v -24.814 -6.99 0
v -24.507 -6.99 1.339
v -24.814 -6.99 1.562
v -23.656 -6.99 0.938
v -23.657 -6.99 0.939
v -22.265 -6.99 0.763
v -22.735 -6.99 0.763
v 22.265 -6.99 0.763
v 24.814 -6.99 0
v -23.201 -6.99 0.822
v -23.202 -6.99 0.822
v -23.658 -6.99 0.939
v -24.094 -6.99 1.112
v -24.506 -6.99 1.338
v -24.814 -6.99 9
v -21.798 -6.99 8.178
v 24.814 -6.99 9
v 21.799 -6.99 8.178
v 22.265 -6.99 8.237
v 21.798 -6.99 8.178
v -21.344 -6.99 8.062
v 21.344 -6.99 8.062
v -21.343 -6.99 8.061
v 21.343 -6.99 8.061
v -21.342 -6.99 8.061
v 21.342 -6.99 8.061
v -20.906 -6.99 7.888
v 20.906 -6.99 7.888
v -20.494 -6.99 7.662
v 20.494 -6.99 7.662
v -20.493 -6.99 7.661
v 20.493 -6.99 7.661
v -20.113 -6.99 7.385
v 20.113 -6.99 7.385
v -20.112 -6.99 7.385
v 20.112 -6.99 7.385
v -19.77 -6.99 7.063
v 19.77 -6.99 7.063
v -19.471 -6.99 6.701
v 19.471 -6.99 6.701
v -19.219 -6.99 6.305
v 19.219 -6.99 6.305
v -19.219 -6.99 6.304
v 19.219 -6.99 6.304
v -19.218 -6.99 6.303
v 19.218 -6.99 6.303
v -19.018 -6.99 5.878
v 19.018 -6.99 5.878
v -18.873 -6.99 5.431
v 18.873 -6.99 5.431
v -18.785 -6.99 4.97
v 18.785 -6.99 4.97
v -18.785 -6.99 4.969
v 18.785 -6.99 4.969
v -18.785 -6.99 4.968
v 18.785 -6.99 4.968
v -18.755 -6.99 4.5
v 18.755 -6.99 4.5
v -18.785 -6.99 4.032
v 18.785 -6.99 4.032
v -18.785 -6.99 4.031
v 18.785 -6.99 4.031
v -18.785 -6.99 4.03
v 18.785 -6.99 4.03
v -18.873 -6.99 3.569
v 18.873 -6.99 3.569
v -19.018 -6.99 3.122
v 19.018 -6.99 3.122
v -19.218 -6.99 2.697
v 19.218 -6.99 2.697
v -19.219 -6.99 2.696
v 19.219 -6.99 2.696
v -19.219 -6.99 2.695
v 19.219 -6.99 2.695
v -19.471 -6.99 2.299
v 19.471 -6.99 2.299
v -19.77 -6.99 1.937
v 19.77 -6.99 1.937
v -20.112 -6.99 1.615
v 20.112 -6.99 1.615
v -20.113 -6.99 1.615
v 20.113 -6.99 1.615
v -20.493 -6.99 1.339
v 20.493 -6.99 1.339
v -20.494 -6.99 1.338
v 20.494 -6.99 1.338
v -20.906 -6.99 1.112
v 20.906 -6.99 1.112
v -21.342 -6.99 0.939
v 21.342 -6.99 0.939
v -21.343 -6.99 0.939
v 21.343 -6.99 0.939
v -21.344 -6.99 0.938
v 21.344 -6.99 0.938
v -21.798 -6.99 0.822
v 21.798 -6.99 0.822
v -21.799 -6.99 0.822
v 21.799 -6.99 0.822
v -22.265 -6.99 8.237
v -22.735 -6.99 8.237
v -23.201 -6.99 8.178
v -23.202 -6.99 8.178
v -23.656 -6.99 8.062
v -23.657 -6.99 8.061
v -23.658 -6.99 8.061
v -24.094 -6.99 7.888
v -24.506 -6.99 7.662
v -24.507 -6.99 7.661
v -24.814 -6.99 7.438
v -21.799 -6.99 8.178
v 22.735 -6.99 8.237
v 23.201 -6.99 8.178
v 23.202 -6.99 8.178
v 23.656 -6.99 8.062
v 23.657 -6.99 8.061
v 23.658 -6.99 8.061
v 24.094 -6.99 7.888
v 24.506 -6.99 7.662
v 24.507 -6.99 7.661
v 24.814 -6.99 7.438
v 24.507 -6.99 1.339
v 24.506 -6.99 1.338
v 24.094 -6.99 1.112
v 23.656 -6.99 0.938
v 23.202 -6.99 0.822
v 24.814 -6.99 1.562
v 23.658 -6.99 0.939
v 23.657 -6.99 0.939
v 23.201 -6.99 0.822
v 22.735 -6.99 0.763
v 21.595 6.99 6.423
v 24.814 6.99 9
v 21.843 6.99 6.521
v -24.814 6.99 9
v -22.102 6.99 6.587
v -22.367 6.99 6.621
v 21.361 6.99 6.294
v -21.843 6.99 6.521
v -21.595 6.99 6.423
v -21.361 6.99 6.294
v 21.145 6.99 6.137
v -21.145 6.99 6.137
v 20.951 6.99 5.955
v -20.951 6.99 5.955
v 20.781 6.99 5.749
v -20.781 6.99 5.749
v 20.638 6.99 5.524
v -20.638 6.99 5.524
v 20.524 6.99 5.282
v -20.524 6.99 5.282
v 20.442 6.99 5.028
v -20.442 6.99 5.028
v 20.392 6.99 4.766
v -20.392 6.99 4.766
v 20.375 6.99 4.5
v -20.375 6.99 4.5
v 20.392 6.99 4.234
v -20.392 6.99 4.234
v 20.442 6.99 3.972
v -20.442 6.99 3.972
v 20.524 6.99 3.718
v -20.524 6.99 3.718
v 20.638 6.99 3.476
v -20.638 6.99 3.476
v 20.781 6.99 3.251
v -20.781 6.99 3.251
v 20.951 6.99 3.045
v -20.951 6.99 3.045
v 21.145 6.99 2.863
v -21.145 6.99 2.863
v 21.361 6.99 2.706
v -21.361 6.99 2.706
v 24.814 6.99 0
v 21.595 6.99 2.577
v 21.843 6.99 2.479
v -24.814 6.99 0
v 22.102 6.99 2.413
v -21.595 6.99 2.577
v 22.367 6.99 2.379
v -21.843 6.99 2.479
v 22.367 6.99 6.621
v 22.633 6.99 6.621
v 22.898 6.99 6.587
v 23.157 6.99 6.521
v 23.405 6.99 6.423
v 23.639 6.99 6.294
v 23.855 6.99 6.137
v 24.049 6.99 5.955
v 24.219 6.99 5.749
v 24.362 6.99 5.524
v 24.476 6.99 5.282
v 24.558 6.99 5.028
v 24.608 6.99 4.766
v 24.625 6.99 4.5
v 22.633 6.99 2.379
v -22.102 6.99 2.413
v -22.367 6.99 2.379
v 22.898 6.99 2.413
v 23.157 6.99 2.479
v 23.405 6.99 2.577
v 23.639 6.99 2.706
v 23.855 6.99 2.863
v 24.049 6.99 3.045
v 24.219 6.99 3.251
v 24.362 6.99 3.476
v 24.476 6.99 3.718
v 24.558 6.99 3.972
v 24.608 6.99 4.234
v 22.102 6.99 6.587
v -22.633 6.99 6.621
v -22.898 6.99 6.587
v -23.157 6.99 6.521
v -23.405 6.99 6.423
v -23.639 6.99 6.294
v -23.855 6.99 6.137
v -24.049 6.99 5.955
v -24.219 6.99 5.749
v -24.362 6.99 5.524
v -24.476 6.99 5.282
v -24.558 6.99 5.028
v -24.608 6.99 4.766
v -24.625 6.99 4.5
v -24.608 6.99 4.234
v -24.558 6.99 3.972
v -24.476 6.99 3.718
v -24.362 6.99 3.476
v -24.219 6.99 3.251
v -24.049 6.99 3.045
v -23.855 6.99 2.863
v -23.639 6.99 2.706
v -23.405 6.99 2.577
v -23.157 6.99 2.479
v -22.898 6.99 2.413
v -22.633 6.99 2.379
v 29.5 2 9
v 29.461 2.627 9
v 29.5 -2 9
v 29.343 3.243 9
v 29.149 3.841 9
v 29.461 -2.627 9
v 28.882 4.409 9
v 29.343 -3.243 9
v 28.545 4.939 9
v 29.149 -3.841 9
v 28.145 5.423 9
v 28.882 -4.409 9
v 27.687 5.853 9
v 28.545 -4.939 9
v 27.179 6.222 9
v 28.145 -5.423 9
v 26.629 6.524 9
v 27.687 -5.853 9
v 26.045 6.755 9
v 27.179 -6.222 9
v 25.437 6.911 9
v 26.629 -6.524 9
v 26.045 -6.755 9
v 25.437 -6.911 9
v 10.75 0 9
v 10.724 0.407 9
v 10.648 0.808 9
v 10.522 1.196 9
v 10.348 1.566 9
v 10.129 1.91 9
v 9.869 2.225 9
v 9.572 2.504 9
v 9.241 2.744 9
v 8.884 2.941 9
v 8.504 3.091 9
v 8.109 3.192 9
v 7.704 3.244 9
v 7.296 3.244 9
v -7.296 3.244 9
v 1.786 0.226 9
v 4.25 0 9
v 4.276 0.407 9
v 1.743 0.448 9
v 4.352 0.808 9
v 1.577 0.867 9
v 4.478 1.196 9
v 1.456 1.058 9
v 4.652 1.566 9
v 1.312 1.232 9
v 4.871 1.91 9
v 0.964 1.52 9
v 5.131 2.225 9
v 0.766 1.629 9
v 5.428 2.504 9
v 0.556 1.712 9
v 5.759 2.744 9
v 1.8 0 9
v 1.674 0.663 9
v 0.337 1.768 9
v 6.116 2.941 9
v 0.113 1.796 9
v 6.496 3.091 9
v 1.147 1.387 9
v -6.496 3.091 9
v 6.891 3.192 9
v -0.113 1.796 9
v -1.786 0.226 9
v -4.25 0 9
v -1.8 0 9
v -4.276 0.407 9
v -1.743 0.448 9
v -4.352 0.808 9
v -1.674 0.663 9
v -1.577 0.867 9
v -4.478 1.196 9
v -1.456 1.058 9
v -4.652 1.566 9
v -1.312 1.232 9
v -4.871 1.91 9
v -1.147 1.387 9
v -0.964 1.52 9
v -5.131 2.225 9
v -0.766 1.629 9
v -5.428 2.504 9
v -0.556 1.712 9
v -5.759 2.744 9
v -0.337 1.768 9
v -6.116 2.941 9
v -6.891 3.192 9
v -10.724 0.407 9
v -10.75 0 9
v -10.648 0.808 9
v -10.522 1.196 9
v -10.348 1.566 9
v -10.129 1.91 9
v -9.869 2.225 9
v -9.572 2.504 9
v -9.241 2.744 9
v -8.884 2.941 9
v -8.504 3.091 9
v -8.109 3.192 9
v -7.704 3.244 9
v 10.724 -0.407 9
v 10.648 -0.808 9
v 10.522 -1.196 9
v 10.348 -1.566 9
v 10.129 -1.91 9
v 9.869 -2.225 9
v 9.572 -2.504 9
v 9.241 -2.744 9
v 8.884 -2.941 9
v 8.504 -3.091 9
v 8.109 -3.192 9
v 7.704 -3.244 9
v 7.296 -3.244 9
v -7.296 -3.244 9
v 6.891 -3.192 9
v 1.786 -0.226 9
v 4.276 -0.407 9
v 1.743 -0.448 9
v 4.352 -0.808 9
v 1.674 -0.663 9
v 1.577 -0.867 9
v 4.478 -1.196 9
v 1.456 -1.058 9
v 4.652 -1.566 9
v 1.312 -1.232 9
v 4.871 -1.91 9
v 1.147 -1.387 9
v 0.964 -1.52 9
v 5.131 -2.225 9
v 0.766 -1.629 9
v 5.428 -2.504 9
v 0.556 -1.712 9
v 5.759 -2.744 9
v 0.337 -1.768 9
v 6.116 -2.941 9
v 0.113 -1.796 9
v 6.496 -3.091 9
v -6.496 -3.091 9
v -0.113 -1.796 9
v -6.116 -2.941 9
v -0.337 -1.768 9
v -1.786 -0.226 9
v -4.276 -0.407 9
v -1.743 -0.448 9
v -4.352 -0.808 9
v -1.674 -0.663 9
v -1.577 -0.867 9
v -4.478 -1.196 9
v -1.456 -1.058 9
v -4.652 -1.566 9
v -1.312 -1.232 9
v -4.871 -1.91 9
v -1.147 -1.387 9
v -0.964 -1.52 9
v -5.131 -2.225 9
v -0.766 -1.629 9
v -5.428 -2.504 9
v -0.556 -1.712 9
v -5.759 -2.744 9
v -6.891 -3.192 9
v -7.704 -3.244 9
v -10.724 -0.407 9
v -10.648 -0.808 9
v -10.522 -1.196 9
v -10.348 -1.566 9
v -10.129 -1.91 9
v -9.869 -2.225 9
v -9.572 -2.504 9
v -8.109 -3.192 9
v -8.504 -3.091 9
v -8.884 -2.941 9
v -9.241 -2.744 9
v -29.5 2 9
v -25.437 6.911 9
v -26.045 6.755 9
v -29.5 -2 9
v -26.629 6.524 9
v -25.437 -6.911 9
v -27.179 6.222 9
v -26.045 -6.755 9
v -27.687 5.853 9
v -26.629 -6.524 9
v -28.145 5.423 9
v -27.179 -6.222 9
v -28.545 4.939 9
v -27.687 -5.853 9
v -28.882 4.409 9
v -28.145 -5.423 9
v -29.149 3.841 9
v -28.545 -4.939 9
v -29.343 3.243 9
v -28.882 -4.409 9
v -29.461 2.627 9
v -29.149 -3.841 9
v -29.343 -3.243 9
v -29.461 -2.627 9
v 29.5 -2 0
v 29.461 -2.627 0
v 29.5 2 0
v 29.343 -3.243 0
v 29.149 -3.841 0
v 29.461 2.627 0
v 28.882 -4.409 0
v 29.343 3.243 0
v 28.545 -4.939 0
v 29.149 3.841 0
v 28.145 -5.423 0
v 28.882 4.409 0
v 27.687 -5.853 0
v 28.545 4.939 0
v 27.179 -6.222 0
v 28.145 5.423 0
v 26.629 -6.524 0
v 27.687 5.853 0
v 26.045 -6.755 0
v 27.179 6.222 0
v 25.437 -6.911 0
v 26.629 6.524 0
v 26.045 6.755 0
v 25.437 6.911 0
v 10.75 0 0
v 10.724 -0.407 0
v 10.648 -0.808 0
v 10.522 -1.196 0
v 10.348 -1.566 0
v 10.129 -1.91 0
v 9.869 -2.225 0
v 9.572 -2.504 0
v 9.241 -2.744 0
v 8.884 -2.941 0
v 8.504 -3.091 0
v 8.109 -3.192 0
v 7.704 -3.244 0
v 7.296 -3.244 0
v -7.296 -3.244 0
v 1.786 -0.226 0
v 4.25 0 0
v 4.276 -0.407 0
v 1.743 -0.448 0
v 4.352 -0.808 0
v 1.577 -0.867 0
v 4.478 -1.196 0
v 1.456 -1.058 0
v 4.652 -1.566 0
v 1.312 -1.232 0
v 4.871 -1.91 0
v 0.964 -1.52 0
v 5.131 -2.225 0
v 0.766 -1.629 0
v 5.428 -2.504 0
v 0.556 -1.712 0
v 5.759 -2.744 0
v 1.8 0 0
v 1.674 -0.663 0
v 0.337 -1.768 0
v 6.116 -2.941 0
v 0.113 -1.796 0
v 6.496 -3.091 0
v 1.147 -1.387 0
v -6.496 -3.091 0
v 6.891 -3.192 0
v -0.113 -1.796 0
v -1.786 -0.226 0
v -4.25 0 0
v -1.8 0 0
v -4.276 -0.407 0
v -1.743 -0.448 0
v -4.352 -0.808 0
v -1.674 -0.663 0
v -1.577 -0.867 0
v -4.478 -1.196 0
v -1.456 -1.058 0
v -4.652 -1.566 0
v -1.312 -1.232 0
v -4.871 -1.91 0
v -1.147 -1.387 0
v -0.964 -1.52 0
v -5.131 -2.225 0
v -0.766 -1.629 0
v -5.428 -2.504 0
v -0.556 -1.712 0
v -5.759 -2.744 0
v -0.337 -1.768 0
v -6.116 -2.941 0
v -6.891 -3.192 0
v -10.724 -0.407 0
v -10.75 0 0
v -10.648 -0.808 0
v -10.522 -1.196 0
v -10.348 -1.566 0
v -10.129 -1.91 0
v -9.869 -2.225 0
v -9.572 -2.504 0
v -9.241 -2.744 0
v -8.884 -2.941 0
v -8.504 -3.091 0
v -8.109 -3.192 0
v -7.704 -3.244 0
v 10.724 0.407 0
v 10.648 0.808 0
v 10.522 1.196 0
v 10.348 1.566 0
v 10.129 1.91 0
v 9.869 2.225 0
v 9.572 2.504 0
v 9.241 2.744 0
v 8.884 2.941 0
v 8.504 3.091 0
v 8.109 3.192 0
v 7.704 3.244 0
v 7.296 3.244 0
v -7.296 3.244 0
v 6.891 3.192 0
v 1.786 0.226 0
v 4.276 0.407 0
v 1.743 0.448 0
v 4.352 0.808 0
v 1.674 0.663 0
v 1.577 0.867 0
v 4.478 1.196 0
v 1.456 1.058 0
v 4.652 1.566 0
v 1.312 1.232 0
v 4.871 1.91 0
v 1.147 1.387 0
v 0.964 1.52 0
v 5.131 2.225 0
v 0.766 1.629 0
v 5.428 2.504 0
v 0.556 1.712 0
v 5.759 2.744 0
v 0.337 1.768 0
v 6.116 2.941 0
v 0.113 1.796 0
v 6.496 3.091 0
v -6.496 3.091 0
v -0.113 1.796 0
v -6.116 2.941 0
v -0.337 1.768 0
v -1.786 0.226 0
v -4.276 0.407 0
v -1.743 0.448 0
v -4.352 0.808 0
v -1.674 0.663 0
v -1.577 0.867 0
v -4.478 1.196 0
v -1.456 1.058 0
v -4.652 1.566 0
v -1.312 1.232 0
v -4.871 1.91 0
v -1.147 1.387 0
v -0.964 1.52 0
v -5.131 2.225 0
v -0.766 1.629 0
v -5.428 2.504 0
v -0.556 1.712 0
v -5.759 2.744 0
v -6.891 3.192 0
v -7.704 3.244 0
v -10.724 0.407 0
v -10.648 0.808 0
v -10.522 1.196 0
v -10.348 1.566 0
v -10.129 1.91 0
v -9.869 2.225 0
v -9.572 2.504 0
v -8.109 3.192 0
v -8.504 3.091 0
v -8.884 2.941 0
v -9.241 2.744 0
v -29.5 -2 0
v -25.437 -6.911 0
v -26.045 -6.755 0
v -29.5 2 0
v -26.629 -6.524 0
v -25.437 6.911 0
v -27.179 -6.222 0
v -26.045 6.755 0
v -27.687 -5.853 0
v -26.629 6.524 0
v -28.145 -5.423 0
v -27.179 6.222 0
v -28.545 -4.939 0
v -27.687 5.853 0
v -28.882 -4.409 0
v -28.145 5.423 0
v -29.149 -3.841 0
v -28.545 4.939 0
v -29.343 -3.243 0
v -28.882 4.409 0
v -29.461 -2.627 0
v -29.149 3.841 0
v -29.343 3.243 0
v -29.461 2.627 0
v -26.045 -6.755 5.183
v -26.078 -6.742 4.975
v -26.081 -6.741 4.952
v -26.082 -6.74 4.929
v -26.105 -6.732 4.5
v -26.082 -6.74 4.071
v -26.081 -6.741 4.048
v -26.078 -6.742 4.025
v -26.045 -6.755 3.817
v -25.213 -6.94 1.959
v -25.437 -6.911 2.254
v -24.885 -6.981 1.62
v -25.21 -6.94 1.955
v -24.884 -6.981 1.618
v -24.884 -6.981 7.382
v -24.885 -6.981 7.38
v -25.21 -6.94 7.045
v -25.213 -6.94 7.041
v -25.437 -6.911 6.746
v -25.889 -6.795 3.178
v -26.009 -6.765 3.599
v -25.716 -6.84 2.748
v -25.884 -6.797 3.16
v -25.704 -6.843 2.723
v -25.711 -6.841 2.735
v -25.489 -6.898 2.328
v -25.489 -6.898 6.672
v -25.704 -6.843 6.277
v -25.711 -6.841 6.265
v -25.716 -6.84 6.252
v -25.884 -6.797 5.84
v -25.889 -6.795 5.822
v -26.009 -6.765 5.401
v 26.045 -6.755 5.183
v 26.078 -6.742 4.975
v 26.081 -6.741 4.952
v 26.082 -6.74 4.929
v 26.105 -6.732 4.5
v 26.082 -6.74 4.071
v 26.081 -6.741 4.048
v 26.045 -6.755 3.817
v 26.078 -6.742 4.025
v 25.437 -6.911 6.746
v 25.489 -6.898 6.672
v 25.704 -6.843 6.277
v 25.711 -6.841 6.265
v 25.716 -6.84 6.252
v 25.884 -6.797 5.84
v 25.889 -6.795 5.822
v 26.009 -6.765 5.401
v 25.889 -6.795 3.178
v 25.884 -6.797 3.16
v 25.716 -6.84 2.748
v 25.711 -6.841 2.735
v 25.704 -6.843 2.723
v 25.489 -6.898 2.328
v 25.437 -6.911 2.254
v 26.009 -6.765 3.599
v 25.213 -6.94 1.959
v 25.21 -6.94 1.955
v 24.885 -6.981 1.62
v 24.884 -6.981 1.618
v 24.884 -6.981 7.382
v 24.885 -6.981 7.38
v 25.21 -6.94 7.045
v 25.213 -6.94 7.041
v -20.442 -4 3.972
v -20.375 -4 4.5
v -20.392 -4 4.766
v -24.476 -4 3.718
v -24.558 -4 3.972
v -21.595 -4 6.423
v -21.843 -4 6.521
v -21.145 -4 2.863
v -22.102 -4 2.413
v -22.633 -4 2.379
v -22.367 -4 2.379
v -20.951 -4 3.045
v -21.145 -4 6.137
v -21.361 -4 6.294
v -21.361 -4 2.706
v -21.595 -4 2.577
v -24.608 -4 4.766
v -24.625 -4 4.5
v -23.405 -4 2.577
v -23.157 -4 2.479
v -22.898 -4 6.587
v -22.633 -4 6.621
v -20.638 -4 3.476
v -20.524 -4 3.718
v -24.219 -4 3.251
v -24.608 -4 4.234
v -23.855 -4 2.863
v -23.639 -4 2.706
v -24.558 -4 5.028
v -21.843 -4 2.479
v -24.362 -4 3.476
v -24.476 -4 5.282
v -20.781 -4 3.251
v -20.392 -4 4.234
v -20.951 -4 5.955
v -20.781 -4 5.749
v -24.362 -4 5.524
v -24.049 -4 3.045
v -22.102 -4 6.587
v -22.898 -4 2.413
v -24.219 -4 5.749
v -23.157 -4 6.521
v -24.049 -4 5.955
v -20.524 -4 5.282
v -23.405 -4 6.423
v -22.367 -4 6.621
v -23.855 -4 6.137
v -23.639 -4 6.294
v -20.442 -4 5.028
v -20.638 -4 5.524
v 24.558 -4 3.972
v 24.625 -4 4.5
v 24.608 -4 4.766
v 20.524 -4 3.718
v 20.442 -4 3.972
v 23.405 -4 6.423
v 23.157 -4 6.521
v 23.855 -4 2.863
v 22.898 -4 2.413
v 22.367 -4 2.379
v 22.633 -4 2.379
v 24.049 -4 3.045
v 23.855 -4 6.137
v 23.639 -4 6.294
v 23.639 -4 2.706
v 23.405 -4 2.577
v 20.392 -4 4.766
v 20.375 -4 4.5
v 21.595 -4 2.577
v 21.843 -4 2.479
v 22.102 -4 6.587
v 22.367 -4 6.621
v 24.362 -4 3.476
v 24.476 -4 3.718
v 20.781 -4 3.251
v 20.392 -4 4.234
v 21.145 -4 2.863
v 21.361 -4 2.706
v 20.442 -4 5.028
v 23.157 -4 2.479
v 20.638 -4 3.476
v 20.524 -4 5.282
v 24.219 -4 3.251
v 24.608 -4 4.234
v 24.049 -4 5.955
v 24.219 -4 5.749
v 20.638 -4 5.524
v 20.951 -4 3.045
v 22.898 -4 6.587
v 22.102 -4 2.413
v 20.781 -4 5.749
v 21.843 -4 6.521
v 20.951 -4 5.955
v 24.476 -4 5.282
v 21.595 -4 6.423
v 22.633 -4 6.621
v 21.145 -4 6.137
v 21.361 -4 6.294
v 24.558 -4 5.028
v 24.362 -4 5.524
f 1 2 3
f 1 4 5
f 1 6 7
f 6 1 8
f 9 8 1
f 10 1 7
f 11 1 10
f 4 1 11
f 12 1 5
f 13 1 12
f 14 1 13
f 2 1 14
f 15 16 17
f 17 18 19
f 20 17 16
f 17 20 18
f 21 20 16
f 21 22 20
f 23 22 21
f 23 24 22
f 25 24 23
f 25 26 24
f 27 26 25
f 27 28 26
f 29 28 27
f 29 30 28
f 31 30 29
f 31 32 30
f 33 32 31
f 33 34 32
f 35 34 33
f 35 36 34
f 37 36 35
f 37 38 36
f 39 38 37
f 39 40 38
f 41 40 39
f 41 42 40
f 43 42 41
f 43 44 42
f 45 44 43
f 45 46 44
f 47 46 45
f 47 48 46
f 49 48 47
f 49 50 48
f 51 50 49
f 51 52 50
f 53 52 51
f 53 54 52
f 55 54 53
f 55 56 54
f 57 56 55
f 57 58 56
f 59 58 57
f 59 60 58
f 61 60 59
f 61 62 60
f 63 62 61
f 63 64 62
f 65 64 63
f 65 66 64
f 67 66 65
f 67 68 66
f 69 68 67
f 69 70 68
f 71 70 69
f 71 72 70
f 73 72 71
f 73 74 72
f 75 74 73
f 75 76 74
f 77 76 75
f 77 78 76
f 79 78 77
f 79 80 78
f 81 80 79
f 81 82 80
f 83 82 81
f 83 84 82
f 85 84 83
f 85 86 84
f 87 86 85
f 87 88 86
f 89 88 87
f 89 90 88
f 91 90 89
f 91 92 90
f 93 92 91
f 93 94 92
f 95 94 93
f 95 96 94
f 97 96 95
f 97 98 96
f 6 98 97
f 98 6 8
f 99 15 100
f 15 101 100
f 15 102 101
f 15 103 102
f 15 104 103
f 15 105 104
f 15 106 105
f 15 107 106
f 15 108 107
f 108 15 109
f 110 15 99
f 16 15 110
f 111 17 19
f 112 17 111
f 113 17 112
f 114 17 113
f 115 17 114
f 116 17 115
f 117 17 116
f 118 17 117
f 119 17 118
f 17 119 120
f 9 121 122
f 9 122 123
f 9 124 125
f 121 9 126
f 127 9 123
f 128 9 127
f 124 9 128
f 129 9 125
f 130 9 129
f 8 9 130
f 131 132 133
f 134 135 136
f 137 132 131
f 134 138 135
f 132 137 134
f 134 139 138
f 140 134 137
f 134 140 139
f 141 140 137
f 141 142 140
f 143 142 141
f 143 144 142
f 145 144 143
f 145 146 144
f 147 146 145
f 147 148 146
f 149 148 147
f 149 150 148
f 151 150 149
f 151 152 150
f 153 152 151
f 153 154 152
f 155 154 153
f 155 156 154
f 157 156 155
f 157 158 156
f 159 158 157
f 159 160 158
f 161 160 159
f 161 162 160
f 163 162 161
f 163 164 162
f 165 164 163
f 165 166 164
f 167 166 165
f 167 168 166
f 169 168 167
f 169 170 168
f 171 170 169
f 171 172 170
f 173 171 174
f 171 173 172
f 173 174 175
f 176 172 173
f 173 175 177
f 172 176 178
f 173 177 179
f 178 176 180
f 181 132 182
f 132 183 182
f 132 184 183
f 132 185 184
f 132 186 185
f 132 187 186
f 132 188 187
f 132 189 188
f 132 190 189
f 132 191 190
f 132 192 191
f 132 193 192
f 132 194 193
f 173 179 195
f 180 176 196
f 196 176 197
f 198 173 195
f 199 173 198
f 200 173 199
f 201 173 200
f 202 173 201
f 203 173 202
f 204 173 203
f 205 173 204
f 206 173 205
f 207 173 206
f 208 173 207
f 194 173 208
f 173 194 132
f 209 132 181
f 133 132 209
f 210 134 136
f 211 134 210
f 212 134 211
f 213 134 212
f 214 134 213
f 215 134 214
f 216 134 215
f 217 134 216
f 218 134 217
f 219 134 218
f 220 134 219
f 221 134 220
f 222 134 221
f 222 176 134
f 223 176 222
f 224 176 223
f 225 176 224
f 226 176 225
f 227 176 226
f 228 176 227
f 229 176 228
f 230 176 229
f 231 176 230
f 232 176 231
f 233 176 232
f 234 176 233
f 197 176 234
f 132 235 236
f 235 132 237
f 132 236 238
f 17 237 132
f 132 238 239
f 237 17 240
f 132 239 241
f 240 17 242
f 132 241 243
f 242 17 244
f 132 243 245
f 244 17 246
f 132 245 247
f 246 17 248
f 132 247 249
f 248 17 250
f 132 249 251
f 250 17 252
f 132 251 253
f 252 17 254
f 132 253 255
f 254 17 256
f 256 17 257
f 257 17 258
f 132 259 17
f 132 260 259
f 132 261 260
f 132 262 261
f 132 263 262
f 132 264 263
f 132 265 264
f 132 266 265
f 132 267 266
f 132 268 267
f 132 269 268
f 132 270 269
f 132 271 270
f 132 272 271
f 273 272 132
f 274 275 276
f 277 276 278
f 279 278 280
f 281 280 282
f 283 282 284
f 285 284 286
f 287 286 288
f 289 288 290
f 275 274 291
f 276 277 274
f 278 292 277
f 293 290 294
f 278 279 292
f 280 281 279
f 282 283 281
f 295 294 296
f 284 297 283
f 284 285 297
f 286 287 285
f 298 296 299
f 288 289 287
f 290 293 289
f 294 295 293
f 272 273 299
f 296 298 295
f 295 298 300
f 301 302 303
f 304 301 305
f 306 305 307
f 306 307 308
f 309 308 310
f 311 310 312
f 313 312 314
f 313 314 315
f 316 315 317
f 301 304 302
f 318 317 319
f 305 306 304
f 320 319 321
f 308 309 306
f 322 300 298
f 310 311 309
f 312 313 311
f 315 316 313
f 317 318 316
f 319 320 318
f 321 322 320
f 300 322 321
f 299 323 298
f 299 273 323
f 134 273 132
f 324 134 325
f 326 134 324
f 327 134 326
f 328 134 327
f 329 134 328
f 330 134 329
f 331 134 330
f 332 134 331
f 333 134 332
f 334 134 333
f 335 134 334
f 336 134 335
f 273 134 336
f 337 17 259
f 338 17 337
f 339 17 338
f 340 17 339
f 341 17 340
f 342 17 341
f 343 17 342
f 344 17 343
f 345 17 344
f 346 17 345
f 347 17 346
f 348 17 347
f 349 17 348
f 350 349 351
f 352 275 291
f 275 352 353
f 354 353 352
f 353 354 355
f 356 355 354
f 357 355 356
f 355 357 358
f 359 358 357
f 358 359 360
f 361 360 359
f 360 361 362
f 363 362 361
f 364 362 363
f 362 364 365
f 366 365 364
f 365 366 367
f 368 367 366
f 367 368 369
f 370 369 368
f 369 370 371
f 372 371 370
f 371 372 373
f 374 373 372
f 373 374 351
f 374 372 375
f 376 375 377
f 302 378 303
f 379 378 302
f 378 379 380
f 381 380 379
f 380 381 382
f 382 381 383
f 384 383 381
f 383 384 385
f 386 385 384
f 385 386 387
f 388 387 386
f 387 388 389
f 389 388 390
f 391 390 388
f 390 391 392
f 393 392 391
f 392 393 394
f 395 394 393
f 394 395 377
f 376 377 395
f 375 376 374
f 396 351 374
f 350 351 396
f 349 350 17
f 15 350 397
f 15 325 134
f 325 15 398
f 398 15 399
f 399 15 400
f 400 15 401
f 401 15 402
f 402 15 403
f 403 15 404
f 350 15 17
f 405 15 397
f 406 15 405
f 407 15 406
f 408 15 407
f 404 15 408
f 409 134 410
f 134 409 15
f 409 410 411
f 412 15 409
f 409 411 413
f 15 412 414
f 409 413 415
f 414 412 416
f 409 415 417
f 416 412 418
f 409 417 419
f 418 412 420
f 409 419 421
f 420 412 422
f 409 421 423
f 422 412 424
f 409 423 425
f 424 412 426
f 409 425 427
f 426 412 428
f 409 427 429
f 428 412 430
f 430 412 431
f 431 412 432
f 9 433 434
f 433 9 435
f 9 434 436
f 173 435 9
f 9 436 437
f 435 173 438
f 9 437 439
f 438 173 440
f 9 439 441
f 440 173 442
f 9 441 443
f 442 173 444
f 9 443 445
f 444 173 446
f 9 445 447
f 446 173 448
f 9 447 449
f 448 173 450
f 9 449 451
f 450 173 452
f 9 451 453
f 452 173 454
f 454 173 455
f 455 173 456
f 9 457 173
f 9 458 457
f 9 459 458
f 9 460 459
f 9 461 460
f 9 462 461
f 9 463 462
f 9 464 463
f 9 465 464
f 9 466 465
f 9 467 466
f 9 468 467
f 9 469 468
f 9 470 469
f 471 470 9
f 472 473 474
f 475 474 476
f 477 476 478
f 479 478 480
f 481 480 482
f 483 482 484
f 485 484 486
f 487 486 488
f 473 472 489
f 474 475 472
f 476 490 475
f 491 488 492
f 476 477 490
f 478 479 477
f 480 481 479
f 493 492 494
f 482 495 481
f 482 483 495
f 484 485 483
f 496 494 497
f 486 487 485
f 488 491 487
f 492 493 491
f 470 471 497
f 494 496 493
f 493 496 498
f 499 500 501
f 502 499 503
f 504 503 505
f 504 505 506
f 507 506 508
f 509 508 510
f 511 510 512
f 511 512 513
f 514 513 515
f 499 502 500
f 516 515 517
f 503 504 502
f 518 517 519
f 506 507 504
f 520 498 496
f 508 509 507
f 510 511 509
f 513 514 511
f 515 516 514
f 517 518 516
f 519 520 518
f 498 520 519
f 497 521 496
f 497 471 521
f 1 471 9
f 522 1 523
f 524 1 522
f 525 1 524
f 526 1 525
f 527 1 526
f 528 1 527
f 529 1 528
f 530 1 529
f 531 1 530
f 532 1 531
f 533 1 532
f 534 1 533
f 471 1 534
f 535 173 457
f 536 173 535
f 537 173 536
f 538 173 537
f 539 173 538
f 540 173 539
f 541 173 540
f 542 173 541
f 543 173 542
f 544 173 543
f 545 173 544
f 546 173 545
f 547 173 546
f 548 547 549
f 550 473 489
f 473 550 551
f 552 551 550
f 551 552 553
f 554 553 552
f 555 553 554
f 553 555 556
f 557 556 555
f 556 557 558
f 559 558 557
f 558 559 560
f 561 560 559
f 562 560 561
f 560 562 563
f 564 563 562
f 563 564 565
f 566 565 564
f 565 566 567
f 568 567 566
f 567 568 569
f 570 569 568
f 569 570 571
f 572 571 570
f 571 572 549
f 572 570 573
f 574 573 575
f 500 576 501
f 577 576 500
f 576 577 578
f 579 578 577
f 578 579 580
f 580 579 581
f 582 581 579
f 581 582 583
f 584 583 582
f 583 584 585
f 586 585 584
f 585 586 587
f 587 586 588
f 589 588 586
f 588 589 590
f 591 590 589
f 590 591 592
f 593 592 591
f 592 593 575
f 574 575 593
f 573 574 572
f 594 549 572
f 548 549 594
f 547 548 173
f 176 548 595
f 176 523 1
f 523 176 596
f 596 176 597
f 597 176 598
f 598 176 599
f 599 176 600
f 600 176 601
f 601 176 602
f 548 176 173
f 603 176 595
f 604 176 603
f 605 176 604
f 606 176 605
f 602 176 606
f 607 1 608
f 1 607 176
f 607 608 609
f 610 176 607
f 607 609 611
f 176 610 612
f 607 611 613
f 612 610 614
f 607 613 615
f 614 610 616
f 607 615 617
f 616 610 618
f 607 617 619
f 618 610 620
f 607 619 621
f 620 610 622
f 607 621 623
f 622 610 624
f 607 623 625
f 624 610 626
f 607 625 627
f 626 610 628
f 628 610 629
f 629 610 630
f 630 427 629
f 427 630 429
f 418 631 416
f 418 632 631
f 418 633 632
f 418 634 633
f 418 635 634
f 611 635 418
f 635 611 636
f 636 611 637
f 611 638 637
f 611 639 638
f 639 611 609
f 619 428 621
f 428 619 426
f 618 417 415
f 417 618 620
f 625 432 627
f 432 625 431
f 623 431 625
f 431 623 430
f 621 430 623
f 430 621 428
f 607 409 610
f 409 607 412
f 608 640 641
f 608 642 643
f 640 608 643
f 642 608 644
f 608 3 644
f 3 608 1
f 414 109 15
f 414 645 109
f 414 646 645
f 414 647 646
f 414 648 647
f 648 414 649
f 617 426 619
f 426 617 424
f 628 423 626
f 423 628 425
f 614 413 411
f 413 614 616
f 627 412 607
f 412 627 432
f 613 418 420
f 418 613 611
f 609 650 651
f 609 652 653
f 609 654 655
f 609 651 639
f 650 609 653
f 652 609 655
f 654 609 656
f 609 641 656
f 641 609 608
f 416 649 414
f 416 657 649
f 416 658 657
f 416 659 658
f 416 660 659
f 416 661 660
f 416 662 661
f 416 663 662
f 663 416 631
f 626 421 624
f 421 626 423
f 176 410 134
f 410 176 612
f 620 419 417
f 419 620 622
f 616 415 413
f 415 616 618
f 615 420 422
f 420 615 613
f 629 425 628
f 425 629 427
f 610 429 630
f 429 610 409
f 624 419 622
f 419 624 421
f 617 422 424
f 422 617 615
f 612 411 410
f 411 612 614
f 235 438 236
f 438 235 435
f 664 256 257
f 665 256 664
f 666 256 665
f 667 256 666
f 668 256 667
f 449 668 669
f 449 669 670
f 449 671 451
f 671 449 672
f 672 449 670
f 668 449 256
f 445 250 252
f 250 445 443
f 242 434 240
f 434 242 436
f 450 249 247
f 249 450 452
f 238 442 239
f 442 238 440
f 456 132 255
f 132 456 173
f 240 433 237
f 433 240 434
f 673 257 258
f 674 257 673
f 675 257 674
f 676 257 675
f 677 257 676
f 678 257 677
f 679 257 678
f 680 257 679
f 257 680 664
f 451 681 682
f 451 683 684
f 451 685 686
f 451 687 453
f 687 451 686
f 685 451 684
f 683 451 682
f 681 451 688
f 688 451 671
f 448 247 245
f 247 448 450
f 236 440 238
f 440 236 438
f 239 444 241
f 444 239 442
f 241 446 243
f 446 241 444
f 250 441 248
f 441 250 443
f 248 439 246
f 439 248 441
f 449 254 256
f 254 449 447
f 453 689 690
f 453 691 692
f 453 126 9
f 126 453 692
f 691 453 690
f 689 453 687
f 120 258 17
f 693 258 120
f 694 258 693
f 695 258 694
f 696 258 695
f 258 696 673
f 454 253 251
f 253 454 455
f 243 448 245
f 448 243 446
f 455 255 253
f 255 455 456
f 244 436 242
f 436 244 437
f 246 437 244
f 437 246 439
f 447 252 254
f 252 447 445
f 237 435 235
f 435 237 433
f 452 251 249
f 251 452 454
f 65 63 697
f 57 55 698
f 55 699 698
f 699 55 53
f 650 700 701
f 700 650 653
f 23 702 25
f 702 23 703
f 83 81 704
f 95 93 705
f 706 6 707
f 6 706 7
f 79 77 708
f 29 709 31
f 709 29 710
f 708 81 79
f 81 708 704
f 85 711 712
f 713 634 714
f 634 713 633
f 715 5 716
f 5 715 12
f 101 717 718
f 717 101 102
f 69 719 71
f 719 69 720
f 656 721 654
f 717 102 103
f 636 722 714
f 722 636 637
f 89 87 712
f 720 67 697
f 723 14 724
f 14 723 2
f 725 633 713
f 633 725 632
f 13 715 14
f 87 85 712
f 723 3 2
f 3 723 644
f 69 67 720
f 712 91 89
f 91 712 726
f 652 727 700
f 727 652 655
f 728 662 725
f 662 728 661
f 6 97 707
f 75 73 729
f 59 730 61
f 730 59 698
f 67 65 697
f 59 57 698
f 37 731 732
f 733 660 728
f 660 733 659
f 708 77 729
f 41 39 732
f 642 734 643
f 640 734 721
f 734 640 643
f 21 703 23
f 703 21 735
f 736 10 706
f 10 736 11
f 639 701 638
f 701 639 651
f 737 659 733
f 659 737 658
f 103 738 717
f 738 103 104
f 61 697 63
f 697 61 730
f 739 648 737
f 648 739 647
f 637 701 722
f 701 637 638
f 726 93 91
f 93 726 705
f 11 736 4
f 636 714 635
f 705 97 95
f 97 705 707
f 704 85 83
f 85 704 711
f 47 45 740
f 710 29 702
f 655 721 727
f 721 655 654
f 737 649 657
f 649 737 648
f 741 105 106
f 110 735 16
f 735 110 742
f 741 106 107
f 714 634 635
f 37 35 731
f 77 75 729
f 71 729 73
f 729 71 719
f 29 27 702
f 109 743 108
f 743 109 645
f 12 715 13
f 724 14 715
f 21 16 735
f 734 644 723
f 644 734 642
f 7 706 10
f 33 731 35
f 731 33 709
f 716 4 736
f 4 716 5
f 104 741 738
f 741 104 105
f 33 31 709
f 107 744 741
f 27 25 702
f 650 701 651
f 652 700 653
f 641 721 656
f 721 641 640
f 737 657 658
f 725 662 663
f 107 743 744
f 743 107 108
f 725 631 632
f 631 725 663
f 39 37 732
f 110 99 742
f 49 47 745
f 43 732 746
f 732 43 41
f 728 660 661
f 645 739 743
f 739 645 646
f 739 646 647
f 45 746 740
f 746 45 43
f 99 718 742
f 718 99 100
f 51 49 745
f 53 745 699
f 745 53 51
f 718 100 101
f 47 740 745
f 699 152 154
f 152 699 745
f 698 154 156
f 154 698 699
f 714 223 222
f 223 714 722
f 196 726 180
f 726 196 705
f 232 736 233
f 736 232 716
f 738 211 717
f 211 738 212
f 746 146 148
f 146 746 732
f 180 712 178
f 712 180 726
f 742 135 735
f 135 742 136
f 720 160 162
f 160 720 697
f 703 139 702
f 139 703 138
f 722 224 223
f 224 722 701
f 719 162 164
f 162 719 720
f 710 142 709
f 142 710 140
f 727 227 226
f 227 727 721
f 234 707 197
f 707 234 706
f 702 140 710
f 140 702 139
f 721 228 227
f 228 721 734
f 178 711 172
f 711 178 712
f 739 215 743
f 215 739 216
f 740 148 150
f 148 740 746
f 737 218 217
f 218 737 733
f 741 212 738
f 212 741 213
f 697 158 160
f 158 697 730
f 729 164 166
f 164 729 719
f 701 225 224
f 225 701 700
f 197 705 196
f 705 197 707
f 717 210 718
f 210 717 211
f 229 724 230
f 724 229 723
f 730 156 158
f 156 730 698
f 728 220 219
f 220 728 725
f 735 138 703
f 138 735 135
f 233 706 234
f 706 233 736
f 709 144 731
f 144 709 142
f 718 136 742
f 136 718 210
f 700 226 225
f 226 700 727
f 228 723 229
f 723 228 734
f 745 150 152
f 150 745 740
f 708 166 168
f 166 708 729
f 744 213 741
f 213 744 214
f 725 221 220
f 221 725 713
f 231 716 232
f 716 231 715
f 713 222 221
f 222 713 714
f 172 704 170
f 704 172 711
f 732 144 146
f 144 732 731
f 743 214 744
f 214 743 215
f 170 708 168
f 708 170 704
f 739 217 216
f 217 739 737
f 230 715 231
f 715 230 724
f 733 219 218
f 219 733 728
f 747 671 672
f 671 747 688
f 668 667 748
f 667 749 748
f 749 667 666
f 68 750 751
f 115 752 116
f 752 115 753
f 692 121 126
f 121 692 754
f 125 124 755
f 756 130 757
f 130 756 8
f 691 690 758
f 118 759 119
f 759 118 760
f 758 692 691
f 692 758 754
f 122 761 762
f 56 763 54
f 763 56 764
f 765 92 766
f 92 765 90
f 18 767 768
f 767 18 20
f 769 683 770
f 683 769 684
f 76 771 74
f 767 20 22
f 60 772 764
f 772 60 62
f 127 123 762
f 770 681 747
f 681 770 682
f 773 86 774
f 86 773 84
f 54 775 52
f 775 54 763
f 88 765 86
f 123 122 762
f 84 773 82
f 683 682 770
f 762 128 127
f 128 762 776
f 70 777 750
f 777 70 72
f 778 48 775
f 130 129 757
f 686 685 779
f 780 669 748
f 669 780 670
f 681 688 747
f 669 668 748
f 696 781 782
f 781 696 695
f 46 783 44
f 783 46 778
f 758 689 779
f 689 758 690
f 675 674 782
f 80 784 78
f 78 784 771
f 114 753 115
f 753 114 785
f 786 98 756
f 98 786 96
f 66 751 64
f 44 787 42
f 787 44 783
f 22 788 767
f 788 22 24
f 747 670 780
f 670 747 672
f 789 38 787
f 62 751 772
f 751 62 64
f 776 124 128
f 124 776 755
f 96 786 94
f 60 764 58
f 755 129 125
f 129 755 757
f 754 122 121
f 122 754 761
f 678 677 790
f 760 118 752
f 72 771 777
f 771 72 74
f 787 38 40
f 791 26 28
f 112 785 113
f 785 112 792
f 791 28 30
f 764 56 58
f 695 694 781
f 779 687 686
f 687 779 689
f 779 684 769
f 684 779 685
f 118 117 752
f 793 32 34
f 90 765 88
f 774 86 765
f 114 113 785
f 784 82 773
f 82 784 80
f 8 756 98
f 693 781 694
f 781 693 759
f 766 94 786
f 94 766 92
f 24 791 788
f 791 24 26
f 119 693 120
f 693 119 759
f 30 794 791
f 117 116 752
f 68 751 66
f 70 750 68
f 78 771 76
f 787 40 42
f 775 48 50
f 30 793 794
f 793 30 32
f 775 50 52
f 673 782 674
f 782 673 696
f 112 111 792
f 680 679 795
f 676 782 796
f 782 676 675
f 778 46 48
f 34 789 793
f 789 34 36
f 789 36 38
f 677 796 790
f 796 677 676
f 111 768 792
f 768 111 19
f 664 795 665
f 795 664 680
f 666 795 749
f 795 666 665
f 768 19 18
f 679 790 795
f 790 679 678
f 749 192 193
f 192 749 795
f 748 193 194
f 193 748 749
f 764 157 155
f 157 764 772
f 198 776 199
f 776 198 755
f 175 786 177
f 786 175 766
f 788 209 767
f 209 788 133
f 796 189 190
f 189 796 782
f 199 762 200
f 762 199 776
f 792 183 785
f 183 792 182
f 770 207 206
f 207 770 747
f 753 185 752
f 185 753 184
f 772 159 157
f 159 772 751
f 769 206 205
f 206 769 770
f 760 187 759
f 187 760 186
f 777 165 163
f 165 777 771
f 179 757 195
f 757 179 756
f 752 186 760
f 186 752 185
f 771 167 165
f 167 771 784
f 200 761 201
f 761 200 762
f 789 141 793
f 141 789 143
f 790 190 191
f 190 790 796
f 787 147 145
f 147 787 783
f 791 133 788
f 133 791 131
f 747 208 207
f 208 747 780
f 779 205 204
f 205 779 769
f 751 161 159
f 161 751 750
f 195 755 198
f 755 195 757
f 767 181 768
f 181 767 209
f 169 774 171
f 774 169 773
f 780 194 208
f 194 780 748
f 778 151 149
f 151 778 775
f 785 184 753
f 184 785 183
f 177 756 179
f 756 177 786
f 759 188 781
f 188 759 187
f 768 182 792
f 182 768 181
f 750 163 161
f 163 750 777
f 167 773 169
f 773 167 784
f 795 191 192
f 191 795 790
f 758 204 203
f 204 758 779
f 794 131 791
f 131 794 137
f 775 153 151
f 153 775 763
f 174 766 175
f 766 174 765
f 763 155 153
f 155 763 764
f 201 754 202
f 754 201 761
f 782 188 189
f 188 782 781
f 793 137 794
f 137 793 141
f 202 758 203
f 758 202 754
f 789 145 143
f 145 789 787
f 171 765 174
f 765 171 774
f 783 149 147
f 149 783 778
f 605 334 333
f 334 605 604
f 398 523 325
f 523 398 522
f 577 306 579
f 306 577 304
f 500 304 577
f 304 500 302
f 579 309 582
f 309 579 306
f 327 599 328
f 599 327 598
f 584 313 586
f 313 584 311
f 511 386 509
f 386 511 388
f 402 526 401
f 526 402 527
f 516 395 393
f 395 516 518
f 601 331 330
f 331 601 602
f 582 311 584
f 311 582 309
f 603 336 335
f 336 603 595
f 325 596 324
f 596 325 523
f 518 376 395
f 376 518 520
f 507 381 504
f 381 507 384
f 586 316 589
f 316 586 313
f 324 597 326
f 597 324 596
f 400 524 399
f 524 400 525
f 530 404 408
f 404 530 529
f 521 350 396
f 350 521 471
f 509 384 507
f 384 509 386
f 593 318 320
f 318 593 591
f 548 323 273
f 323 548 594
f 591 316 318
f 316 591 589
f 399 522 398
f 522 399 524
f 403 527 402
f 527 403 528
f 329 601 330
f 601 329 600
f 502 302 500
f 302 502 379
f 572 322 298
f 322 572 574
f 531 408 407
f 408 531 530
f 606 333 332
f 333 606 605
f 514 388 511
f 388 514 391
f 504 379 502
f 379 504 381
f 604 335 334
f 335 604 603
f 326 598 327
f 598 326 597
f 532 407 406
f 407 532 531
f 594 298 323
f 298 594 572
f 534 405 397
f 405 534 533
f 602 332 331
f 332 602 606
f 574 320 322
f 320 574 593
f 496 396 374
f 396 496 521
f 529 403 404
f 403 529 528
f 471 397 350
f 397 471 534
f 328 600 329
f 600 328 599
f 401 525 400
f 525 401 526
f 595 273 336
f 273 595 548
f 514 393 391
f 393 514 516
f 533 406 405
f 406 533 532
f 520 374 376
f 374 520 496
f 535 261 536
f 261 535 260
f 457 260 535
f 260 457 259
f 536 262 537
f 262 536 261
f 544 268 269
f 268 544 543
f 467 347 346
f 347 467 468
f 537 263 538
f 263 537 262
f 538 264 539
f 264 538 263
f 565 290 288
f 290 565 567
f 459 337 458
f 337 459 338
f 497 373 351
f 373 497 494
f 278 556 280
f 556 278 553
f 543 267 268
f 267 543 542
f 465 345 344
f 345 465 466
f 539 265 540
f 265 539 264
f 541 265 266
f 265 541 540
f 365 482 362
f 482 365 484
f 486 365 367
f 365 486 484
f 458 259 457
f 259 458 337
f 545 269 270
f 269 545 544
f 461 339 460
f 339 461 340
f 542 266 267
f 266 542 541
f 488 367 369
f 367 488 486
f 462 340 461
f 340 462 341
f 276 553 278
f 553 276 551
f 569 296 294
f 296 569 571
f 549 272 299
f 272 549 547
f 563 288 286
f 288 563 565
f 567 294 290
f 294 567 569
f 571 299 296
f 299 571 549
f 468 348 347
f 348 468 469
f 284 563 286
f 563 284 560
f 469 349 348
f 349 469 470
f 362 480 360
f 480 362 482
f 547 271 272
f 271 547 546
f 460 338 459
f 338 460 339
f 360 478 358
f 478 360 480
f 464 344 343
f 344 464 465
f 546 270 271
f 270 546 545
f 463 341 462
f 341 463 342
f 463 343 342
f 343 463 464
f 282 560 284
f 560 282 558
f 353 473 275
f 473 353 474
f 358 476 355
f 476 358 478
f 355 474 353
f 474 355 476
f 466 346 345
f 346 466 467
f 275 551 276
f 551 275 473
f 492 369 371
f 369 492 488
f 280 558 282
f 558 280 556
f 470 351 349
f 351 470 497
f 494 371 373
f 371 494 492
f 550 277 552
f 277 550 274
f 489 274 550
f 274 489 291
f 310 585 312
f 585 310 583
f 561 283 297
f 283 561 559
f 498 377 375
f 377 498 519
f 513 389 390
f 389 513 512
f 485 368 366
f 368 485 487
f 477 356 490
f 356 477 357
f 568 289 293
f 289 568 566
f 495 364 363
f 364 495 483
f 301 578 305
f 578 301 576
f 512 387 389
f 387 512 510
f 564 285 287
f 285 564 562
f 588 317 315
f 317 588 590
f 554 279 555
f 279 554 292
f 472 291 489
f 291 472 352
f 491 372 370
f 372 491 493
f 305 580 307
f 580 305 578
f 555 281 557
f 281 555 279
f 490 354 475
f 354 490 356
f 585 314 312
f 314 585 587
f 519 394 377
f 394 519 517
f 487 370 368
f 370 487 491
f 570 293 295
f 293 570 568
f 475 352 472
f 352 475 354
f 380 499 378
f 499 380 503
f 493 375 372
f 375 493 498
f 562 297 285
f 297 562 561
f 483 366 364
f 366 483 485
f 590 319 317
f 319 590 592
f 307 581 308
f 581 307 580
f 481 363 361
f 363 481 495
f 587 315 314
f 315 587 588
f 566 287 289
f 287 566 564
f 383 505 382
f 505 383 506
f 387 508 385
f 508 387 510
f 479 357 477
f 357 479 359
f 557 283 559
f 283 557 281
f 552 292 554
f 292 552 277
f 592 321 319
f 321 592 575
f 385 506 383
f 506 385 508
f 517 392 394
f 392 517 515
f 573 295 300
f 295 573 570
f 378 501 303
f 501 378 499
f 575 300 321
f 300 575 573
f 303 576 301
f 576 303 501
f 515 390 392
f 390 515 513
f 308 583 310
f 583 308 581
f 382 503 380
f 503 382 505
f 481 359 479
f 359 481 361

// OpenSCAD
$fn = 50;


difference() {
	union() {
		hull() {
			translate(v = [-9.5000000000, 2.0000000000, 0]) {
				cylinder(h = 9, r = 5);
			}
			translate(v = [9.5000000000, 2.0000000000, 0]) {
				cylinder(h = 9, r = 5);
			}
			translate(v = [-9.5000000000, -2.0000000000, 0]) {
				cylinder(h = 9, r = 5);
			}
			translate(v = [9.5000000000, -2.0000000000, 0]) {
				cylinder(h = 9, r = 5);
			}
		}
		translate(v = [-15.0000000000, 0.0000000000, 0]) {
			hull() {
				translate(v = [-9.5000000000, 2.0000000000, 0]) {
					cylinder(h = 9, r = 5);
				}
				translate(v = [9.5000000000, 2.0000000000, 0]) {
					cylinder(h = 9, r = 5);
				}
				translate(v = [-9.5000000000, -2.0000000000, 0]) {
					cylinder(h = 9, r = 5);
				}
				translate(v = [9.5000000000, -2.0000000000, 0]) {
					cylinder(h = 9, r = 5);
				}
			}
		}
		translate(v = [15.0000000000, 0.0000000000, 0]) {
			hull() {
				translate(v = [-9.5000000000, 2.0000000000, 0]) {
					cylinder(h = 9, r = 5);
				}
				translate(v = [9.5000000000, 2.0000000000, 0]) {
					cylinder(h = 9, r = 5);
				}
				translate(v = [-9.5000000000, -2.0000000000, 0]) {
					cylinder(h = 9, r = 5);
				}
				translate(v = [9.5000000000, -2.0000000000, 0]) {
					cylinder(h = 9, r = 5);
				}
			}
		}
	}
	union() {
		translate(v = [-22.5000000000, -7.0000000000, 4.5000000000]) {
			rotate(a = [90, 0, 0]) {
				difference() {
					union() {
						#translate(v = [0, 0, -14.0000000000]) {
							cylinder(h = 14, r = 2.0000000000);
						}
						#translate(v = [0, 0, -3]) {
							cylinder(h = 3, r1 = 2.1250000000, r2 = 3.7500000000);
						}
						#translate(v = [0, 0, -14.0000000000]) {
							cylinder(h = 14, r = 2.1250000000);
						}
						#translate(v = [0, 0, -14.0000000000]) {
							cylinder(h = 14, r = 2.0000000000);
						}
					}
					union();
				}
			}
		}
		translate(v = [22.5000000000, -7.0000000000, 4.5000000000]) {
			rotate(a = [90, 0, 0]) {
				difference() {
					union() {
						#translate(v = [0, 0, -14.0000000000]) {
							cylinder(h = 14, r = 2.0000000000);
						}
						#translate(v = [0, 0, -3]) {
							cylinder(h = 3, r1 = 2.1250000000, r2 = 3.7500000000);
						}
						#translate(v = [0, 0, -14.0000000000]) {
							cylinder(h = 14, r = 2.1250000000);
						}
						#translate(v = [0, 0, -14.0000000000]) {
							cylinder(h = 14, r = 2.0000000000);
						}
					}
					union();
				}
			}
		}
		translate(v = [-7.5000000000, 0.0000000000, 0]) {
			translate(v = [0, 0, -100]) {
				cylinder(h = 200, r = 3.2500000000);
			}
		}
		translate(v = [7.5000000000, 0.0000000000, 0]) {
			translate(v = [0, 0, -100]) {
				cylinder(h = 200, r = 3.2500000000);
			}
		}
		translate(v = [-7.5000000000, 0.0000000000, 0]) {
			translate(v = [0, 0, -100]) {
				cylinder(h = 200, r = 1.8000000000);
			}
		}
		translate(v = [0, 0, -100]) {
			cylinder(h = 200, r = 1.8000000000);
		}
		translate(v = [7.5000000000, 0.0000000000, 0]) {
			translate(v = [0, 0, -100]) {
				cylinder(h = 200, r = 1.8000000000);
			}
		}
	}
}
